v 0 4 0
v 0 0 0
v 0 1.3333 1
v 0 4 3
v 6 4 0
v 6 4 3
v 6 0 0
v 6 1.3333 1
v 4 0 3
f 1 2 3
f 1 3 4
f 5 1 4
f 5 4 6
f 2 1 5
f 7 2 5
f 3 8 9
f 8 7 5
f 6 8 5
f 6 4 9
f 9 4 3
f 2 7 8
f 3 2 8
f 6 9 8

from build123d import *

# Parameters (mm, degrees)
F0_W      = 6
F0_H      = 4
F1_DEPTH  = 3
F3_DEPTH  = 6
F7_DEPTH  = 25
F10_DEPTH = 25


with BuildPart() as f1:
    # F0 (on Top) → F1 (new body)
    with BuildSketch(Plane.XY):
        with Locations((3, 2)):
            Rectangle(F0_W, F0_H)
    extrude(amount=F1_DEPTH)

    # F2 (on face) → F3 (cut)
    with BuildSketch(Plane.YZ.offset(6)):
        Polygon((0, 3), (0, 0), (1.3333333333, 1), align=None)
    extrude(amount=-F3_DEPTH, mode=Mode.SUBTRACT)

    # F6 (on 3pt) → F7 (cut)
    with BuildSketch(Plane(origin=(0, 0, 0), x_dir=(0.8574929257, -0.3086974533, 0.4115966043), z_dir=(-0.5144957554, -0.5144957554, 0.6859943406))):
        Polygon((9.8441252485, 6.5278601833), (-4.6357093379, 5.8104698546), (-5.503593944, -1.5349624446), (8.062466979, -1.5349624446), align=None)
    extrude(amount=F7_DEPTH, mode=Mode.SUBTRACT)

    # F9 (on 3pt) → F10 (cut)
    with BuildSketch(Plane(origin=(3.5409836066, -1.7704918033, 2.3606557377), x_dir=(0.3195993709, 0.9232870715, 0.2130662473), z_dir=(0.7682212796, -0.3841106398, 0.5121475197))):
        Polygon((12.3663526028, -1.9071685383), (-0.4412117123, 3.9235553704), (-3.5908352584, -2.3459291551), (9.8697831854, -6.3195335679), align=None)
    extrude(amount=F10_DEPTH, mode=Mode.SUBTRACT)


solid = f1.part
